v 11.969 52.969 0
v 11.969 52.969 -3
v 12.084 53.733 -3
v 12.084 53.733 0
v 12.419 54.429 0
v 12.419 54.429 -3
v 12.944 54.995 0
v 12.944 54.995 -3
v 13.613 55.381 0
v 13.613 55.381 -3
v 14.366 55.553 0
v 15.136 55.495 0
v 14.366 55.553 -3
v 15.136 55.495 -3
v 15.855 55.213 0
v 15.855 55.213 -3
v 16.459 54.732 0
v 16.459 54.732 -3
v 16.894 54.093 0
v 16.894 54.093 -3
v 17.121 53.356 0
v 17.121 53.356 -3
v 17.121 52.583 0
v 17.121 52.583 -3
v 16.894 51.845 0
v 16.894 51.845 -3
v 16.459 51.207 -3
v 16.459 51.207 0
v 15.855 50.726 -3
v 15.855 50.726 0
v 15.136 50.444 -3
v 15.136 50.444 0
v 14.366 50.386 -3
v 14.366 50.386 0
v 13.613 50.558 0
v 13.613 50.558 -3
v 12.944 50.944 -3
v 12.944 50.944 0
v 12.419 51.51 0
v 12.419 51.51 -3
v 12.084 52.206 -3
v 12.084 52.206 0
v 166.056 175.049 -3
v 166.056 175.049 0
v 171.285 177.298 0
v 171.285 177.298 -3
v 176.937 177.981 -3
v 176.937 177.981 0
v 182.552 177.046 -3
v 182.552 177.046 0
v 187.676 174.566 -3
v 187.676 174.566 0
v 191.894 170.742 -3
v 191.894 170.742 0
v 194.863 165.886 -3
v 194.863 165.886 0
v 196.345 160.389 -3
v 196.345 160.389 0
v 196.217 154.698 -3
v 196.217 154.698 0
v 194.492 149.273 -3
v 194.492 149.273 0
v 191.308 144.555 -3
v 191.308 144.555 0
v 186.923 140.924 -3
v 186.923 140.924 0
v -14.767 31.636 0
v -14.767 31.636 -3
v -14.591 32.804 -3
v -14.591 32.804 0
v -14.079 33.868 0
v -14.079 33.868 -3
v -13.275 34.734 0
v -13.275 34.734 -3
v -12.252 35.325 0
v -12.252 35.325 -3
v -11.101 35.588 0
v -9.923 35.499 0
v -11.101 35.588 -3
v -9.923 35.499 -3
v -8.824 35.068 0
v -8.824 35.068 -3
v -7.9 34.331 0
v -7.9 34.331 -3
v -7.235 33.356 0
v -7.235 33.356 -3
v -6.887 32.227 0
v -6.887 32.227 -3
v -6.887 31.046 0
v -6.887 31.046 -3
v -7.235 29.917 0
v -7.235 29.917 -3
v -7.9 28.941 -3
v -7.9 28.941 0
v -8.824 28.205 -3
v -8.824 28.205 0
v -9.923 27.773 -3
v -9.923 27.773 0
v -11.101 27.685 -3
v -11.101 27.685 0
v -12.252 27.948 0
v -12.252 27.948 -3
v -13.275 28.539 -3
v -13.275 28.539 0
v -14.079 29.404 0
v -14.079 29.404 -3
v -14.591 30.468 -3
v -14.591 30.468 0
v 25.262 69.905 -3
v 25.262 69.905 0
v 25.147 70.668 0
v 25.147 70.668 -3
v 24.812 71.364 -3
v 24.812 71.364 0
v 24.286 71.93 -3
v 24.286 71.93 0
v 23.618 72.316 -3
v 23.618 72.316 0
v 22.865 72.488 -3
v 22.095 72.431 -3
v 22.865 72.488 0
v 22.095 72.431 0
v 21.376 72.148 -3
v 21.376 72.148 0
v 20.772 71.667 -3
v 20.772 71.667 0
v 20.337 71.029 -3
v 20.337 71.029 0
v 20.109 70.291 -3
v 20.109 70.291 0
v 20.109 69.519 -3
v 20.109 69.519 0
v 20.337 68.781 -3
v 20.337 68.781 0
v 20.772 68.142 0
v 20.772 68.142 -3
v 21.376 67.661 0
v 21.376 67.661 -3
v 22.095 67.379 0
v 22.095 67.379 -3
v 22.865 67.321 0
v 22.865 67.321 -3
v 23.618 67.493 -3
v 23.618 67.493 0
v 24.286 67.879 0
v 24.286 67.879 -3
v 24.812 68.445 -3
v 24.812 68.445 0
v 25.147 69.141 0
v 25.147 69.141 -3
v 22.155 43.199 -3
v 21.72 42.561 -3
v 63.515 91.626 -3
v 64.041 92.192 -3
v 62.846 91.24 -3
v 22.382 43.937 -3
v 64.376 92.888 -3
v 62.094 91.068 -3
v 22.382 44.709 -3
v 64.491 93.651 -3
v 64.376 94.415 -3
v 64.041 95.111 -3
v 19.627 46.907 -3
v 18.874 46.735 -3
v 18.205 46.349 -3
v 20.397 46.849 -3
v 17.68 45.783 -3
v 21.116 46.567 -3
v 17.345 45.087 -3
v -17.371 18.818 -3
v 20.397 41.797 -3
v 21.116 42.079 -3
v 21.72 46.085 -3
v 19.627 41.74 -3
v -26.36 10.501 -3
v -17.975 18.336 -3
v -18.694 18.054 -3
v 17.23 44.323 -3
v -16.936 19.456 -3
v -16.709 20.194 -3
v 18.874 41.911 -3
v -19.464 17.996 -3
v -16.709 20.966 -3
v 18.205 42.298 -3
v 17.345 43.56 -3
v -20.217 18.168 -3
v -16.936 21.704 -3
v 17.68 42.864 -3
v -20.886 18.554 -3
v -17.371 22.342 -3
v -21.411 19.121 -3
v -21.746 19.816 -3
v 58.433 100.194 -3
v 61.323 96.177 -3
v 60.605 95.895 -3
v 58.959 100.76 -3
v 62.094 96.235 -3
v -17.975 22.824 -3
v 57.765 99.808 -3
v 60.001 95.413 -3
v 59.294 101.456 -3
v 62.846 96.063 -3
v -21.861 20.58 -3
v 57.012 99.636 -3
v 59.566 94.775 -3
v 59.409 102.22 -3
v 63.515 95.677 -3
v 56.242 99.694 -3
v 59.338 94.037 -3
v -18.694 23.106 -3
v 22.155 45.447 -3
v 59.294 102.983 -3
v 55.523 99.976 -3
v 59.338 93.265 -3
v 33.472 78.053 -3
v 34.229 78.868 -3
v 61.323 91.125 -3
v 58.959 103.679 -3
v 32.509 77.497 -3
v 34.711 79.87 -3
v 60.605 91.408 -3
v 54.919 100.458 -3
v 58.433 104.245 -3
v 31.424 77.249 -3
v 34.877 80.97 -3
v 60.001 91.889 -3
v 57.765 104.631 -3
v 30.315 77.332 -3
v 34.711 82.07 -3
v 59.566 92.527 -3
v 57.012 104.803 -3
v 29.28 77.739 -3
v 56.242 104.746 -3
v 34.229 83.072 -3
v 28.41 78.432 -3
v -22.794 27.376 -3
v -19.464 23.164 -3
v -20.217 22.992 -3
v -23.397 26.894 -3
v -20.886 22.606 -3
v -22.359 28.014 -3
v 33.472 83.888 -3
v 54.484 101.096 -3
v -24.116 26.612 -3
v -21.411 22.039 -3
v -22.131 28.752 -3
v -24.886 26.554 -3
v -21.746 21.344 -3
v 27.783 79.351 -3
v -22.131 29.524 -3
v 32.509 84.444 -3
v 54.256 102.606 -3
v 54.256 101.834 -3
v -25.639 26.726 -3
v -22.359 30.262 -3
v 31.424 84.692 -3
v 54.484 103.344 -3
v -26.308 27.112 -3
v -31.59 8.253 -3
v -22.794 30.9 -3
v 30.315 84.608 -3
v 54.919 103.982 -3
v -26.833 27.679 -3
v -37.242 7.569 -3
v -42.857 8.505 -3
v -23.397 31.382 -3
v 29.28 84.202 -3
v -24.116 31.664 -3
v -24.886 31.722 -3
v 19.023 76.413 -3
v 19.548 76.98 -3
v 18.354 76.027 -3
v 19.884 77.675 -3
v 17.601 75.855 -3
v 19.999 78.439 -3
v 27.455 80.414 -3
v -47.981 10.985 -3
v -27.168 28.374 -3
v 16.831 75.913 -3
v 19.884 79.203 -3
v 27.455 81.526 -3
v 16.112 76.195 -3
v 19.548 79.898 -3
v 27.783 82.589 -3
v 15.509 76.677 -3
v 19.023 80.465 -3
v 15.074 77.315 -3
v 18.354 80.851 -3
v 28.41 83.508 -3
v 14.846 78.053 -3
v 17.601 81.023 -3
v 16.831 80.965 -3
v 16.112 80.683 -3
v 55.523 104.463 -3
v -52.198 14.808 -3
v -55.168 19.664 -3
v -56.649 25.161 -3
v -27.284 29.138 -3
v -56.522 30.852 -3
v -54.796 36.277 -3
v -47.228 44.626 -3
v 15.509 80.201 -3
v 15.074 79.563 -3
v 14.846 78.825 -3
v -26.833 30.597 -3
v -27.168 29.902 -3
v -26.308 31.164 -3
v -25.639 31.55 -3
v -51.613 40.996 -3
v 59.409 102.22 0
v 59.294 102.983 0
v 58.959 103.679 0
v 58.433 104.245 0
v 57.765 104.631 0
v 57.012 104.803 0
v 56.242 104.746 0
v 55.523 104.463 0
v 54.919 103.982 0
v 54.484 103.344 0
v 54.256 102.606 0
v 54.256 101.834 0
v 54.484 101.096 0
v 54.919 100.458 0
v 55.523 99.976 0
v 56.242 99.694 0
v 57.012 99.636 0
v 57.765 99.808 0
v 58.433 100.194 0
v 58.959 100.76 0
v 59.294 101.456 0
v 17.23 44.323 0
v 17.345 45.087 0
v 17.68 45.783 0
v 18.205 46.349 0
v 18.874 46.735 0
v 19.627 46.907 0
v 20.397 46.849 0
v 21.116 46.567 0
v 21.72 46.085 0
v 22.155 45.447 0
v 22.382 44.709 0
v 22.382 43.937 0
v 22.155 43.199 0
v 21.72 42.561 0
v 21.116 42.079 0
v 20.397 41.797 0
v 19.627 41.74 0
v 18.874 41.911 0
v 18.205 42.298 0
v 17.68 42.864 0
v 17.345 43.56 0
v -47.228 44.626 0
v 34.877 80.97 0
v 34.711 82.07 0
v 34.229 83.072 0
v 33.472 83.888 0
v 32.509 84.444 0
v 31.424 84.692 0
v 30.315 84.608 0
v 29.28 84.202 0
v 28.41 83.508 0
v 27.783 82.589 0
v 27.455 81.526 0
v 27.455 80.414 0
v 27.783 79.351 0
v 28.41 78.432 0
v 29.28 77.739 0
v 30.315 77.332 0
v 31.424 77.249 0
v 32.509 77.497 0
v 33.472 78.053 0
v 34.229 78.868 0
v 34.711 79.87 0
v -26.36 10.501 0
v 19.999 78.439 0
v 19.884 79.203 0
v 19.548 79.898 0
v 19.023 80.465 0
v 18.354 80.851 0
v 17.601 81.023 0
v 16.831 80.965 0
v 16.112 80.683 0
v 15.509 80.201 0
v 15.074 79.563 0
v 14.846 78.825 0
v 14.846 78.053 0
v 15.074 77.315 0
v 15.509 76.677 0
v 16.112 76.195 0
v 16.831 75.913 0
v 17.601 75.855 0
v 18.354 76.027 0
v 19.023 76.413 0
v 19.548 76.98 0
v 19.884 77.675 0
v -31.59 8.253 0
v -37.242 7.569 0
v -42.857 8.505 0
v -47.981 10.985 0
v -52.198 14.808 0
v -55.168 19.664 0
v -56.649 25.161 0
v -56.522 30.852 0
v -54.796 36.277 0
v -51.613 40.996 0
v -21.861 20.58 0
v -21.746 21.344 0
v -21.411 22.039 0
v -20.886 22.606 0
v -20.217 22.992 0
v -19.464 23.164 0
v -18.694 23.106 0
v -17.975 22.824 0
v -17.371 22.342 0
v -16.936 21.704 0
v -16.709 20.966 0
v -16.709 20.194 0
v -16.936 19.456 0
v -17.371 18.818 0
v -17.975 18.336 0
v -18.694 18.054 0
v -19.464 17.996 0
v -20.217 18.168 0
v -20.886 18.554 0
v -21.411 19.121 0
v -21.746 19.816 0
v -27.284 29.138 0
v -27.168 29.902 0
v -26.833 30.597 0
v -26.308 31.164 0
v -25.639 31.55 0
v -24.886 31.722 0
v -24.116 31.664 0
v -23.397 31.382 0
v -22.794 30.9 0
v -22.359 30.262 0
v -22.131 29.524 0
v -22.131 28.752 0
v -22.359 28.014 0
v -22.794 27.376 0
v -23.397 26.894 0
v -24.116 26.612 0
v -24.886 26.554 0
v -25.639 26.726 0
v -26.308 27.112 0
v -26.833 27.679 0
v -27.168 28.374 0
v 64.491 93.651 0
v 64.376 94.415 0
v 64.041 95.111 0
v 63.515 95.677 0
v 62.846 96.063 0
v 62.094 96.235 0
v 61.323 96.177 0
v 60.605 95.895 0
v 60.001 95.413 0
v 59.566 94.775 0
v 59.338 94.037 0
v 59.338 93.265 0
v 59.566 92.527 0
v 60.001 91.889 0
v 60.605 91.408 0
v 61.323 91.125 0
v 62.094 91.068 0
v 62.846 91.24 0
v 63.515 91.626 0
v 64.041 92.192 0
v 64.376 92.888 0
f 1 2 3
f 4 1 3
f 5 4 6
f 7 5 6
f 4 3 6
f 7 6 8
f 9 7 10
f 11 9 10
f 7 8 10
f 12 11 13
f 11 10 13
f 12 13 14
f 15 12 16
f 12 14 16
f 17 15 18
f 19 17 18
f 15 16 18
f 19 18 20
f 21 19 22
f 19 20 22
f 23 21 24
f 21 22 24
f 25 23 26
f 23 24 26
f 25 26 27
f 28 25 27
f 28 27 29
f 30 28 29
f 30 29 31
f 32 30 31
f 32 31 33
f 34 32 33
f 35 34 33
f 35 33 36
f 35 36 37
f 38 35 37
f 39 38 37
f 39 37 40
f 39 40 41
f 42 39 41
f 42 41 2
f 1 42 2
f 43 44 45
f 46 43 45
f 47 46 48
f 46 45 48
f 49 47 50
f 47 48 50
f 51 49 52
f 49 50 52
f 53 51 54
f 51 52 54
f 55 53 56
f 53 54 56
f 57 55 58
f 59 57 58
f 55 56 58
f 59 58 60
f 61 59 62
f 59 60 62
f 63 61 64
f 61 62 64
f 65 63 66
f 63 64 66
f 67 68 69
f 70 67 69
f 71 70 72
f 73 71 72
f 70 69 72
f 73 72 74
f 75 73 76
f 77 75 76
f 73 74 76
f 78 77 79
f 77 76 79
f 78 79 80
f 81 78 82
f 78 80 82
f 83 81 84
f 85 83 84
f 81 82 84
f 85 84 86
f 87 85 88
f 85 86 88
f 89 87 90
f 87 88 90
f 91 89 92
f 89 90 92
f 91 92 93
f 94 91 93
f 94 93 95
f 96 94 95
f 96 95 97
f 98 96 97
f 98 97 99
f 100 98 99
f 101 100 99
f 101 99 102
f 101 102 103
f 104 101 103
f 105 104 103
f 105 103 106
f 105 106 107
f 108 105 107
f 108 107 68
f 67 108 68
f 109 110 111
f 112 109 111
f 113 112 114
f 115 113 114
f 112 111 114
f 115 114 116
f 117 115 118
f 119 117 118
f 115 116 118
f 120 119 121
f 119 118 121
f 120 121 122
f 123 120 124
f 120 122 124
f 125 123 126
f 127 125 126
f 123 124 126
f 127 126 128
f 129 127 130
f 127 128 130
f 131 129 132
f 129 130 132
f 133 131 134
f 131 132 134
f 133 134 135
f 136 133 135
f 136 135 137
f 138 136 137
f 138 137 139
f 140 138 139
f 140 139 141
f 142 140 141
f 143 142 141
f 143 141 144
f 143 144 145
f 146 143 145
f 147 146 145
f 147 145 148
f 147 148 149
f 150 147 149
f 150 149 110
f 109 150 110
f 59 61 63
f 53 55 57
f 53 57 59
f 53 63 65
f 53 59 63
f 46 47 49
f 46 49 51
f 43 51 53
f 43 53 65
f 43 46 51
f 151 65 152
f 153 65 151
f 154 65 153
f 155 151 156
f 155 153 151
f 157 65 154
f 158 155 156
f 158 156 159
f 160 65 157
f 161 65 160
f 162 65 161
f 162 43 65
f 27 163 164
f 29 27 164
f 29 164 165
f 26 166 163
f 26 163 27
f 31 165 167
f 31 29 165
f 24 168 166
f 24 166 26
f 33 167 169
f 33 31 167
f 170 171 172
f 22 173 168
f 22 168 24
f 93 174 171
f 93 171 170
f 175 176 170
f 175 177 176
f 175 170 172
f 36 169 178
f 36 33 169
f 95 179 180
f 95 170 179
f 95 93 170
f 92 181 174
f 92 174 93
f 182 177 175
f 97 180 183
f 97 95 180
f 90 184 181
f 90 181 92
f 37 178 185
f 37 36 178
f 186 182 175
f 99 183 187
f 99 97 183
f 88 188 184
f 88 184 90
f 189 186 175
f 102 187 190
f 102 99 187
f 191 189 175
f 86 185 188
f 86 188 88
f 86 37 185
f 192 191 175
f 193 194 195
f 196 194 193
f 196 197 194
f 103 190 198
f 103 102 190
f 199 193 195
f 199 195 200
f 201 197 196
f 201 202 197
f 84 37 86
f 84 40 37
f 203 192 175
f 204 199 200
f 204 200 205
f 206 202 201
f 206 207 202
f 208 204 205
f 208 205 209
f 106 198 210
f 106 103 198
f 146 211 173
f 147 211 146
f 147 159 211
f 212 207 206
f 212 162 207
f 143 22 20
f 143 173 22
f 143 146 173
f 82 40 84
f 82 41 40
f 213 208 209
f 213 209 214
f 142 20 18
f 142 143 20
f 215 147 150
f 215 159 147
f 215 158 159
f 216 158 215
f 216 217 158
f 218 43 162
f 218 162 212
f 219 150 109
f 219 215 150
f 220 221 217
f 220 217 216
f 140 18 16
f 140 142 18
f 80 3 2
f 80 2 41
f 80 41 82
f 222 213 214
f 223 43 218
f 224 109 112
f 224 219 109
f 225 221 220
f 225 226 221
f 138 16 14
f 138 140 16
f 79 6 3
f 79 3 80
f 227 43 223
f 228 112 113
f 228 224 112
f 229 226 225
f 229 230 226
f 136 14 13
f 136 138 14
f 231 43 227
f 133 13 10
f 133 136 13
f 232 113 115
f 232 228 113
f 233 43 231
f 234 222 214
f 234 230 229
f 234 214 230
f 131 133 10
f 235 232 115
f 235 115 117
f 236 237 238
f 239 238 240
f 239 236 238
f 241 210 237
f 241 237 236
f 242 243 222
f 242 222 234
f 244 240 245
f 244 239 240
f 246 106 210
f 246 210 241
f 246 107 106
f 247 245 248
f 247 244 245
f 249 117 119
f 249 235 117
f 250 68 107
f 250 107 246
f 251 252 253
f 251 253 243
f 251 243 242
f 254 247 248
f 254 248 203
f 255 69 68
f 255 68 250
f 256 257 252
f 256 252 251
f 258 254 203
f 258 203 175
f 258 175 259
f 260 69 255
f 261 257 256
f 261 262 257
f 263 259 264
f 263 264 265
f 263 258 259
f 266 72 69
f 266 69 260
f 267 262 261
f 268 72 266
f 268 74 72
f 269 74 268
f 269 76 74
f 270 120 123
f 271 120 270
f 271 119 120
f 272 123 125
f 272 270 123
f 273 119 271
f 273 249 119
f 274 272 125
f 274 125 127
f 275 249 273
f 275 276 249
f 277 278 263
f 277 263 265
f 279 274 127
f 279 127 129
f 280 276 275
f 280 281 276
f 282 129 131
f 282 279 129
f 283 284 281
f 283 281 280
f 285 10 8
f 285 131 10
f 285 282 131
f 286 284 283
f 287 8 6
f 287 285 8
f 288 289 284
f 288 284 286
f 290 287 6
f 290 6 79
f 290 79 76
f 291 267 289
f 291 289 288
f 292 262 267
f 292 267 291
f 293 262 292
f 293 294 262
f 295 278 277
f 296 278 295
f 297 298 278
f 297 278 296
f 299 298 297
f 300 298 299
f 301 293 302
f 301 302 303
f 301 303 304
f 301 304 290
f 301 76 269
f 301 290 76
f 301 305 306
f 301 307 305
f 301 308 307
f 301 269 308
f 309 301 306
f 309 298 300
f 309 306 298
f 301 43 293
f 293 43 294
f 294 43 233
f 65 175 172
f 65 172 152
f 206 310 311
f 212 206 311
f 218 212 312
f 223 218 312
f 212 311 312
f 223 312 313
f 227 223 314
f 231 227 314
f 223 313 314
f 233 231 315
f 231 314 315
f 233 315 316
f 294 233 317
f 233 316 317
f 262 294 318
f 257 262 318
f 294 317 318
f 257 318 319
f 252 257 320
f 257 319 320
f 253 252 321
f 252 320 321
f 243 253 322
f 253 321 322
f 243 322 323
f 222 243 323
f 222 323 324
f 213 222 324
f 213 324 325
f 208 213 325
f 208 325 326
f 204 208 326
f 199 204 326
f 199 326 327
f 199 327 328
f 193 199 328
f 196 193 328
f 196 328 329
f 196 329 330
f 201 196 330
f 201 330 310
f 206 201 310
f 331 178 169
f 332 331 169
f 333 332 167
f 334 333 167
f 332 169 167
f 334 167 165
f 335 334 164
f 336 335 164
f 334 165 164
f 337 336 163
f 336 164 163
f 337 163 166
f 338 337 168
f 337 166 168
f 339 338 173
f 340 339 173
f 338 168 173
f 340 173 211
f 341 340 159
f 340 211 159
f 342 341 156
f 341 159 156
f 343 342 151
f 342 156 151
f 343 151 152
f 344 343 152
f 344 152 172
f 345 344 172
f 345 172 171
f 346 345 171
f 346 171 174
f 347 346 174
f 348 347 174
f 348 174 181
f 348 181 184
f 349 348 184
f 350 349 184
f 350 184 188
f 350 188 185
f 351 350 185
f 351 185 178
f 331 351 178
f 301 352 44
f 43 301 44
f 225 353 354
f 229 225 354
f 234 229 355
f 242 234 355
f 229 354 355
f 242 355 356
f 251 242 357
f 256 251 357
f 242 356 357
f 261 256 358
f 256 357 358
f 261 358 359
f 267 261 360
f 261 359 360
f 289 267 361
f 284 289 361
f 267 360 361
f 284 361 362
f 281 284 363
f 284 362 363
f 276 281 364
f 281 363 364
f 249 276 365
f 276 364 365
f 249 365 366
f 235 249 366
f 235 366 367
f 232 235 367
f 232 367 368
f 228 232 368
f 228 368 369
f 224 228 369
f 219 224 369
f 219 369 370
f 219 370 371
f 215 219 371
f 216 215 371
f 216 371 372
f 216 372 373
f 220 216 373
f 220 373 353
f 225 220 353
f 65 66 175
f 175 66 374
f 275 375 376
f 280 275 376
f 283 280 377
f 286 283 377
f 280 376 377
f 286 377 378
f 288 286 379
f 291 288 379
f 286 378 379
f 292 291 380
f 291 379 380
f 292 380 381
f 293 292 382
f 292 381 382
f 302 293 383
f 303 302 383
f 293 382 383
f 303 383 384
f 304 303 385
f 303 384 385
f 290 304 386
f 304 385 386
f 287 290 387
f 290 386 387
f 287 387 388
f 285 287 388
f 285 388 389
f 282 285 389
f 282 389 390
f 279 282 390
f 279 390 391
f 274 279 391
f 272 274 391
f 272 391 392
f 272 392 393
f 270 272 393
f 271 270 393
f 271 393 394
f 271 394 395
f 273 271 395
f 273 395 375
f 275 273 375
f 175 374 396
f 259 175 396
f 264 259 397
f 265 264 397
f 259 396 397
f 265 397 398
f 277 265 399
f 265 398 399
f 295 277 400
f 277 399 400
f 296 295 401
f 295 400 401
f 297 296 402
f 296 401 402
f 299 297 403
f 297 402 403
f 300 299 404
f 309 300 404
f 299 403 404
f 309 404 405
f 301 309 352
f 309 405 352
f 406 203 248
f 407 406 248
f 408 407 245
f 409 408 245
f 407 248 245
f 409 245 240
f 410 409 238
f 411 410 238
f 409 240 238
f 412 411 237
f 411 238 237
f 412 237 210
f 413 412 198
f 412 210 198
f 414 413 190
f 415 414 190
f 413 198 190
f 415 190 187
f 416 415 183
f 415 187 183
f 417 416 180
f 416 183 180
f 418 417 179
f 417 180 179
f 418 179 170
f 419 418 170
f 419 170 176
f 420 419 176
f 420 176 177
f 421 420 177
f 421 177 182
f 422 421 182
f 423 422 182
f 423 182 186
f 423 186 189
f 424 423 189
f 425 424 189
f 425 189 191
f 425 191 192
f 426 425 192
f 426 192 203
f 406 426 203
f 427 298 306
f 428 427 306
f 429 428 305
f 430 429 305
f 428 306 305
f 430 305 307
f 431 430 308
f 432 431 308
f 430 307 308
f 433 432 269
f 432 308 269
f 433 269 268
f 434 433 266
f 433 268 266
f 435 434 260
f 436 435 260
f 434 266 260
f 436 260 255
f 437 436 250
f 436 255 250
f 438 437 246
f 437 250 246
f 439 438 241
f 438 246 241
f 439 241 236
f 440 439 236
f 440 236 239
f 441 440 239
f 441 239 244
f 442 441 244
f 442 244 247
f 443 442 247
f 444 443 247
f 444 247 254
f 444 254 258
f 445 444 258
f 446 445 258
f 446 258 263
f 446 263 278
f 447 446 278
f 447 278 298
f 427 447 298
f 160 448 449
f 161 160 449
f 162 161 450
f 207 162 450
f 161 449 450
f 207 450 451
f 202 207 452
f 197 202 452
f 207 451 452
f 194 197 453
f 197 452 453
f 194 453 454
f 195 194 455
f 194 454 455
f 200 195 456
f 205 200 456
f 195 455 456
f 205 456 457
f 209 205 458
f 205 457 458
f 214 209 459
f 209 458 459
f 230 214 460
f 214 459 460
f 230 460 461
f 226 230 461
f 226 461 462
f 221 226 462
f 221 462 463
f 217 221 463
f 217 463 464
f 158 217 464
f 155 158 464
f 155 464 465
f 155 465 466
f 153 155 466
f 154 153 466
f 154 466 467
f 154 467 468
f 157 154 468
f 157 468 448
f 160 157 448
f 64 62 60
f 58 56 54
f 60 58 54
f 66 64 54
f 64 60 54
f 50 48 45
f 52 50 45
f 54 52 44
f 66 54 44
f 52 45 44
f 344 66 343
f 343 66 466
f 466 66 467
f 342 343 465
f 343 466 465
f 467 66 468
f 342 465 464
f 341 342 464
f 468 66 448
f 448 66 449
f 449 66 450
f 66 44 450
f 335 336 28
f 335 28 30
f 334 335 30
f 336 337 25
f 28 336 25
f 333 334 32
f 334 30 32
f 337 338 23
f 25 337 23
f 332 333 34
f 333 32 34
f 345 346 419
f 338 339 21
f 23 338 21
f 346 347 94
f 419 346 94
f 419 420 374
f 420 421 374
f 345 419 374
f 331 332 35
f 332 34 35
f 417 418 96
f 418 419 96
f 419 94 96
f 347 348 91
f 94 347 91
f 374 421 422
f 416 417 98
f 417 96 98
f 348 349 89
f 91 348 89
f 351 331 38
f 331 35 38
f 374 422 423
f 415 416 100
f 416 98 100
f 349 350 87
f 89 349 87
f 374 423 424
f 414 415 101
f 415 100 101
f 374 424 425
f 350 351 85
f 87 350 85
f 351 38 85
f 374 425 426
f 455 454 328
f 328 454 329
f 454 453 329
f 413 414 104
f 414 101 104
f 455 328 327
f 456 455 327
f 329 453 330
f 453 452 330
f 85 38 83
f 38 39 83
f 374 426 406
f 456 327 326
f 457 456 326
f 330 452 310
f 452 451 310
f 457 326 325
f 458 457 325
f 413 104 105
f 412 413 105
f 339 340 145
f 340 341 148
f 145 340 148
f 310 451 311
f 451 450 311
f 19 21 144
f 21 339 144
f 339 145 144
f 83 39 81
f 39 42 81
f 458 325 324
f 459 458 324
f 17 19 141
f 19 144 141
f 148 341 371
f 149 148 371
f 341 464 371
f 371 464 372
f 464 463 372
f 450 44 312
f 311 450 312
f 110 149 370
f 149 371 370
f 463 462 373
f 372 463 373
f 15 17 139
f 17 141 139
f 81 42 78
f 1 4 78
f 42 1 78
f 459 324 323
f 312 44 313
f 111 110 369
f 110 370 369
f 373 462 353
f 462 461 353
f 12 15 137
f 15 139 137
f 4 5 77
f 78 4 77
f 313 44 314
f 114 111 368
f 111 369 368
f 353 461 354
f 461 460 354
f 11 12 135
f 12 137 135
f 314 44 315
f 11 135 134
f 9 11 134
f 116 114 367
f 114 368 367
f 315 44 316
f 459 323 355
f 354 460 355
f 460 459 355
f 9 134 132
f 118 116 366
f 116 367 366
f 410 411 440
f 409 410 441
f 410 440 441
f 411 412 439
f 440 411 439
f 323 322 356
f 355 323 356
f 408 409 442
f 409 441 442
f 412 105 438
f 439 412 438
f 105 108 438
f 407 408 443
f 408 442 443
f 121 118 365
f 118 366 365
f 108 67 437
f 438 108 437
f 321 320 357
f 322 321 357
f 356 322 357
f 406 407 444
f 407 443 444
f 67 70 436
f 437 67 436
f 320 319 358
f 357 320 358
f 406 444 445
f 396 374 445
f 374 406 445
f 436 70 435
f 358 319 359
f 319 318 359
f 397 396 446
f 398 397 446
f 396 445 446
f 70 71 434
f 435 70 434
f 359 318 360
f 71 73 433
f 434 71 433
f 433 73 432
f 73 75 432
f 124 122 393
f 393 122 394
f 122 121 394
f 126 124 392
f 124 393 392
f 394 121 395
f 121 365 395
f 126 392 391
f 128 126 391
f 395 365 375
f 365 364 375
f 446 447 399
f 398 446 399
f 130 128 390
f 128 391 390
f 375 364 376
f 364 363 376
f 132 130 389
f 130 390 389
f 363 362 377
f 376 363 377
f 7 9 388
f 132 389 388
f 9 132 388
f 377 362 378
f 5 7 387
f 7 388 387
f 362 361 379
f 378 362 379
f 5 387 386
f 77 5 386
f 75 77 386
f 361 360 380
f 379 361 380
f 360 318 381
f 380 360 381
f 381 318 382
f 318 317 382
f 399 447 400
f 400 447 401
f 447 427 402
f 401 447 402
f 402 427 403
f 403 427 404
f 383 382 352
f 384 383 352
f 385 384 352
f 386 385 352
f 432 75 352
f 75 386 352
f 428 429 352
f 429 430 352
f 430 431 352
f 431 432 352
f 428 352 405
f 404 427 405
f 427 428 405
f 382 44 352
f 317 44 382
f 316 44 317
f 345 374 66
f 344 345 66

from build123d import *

# Parameters (mm, degrees)
BASE_FLANGE3_DEPTH         = 3
SKETCH2_R                  = 3.731705756
CUT_EXTRUDE1_DEPTH         = 10
F_6_0_204_DIAMETER_SLOT2_D = 5.1816
F_6_0_204_DIAMETER_SLOT3_D = 5.1816
F_6_0_204_DIAMETER_SLOT4_D = 5.1816
SKETCH11_R                 = 3.962302528
CUT_EXTRUDE2_DEPTH         = 10


# Sheet-metal steps are written as plain solids
with BuildPart() as part:
    # Sketch1 → Base-Flange3 (new body)
    with BuildSketch(Plane.XY):
        with BuildLine():
            Line((-47.22804279, 44.626403811), (166.055568315, 175.049182627))
            ThreePointArc((166.055568315, 175.049182627), (193.552079509, 168.420316044), (186.923212926, 140.923804851))
            Line((186.923212926, 140.923804851), (-26.360398179, 10.501026034))
            ThreePointArc((-26.360398179, 10.501026034), (-53.856909373, 17.129892617), (-47.22804279, 44.626403811))
        make_face()
    extrude(amount=-BASE_FLANGE3_DEPTH)

    # Sketch2 → Cut-Extrude1 (cut)
    with BuildSketch(Plane.XY):
        with Locations((31.145480049, 80.970292312)):
            Circle(SKETCH2_R)
    extrude(amount=-CUT_EXTRUDE1_DEPTH, mode=Mode.SUBTRACT)

    # #6 (0.204) Diameter Slot2 (through all)
    with Locations(Plane(origin=(0, 0, -3), x_dir=(-1, 0, 0), z_dir=(0, 0, -1))):
        with Locations((-17.407880198, 78.439004647), (-22.671102144, 69.904673863)):
            Hole(F_6_0_204_DIAMETER_SLOT2_D / 2)

    # #6 (0.204) Diameter Slot3 (through all)
    with Locations(Plane(origin=(0, 0, -3), x_dir=(-1, 0, 0), z_dir=(0, 0, -1))):
        with Locations((-56.818082529, 102.219704658), (-61.899947849, 93.651215053)):
            Hole(F_6_0_204_DIAMETER_SLOT3_D / 2)

    # #6 (0.204) Diameter Slot4 (through all)
    with Locations(Plane.XY):
        with Locations((19.820589148, 44.323153185), (14.559362277, 52.969376644), (-19.270561455, 20.579982386), (-24.692774151, 29.137979438)):
            Hole(F_6_0_204_DIAMETER_SLOT4_D / 2)

    # Sketch11 → Cut-Extrude2 (cut)
    with BuildSketch(Plane(origin=(0, 0, -3), x_dir=(-1, 0, 0), z_dir=(0, 0, -1))):
        with Locations((10.804804657, 31.636368095)):
            Circle(SKETCH11_R)
    extrude(amount=-CUT_EXTRUDE2_DEPTH, mode=Mode.SUBTRACT)


solid = part.part
